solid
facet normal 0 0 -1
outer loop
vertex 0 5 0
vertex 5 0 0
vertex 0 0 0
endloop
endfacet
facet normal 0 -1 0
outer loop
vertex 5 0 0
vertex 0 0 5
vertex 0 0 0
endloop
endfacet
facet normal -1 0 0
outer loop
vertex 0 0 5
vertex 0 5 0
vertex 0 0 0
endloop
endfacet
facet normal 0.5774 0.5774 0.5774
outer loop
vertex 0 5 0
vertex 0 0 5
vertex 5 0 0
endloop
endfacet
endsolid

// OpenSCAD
// tetrahedron with triangular faces
polyhedron(points = [[0, 0, 0], [5, 0, 0], [0, 5, 0], [0, 0, 5]],
           faces = [[0, 1, 2], [0, 3, 1], [0, 2, 3], [1, 3, 2]]);
